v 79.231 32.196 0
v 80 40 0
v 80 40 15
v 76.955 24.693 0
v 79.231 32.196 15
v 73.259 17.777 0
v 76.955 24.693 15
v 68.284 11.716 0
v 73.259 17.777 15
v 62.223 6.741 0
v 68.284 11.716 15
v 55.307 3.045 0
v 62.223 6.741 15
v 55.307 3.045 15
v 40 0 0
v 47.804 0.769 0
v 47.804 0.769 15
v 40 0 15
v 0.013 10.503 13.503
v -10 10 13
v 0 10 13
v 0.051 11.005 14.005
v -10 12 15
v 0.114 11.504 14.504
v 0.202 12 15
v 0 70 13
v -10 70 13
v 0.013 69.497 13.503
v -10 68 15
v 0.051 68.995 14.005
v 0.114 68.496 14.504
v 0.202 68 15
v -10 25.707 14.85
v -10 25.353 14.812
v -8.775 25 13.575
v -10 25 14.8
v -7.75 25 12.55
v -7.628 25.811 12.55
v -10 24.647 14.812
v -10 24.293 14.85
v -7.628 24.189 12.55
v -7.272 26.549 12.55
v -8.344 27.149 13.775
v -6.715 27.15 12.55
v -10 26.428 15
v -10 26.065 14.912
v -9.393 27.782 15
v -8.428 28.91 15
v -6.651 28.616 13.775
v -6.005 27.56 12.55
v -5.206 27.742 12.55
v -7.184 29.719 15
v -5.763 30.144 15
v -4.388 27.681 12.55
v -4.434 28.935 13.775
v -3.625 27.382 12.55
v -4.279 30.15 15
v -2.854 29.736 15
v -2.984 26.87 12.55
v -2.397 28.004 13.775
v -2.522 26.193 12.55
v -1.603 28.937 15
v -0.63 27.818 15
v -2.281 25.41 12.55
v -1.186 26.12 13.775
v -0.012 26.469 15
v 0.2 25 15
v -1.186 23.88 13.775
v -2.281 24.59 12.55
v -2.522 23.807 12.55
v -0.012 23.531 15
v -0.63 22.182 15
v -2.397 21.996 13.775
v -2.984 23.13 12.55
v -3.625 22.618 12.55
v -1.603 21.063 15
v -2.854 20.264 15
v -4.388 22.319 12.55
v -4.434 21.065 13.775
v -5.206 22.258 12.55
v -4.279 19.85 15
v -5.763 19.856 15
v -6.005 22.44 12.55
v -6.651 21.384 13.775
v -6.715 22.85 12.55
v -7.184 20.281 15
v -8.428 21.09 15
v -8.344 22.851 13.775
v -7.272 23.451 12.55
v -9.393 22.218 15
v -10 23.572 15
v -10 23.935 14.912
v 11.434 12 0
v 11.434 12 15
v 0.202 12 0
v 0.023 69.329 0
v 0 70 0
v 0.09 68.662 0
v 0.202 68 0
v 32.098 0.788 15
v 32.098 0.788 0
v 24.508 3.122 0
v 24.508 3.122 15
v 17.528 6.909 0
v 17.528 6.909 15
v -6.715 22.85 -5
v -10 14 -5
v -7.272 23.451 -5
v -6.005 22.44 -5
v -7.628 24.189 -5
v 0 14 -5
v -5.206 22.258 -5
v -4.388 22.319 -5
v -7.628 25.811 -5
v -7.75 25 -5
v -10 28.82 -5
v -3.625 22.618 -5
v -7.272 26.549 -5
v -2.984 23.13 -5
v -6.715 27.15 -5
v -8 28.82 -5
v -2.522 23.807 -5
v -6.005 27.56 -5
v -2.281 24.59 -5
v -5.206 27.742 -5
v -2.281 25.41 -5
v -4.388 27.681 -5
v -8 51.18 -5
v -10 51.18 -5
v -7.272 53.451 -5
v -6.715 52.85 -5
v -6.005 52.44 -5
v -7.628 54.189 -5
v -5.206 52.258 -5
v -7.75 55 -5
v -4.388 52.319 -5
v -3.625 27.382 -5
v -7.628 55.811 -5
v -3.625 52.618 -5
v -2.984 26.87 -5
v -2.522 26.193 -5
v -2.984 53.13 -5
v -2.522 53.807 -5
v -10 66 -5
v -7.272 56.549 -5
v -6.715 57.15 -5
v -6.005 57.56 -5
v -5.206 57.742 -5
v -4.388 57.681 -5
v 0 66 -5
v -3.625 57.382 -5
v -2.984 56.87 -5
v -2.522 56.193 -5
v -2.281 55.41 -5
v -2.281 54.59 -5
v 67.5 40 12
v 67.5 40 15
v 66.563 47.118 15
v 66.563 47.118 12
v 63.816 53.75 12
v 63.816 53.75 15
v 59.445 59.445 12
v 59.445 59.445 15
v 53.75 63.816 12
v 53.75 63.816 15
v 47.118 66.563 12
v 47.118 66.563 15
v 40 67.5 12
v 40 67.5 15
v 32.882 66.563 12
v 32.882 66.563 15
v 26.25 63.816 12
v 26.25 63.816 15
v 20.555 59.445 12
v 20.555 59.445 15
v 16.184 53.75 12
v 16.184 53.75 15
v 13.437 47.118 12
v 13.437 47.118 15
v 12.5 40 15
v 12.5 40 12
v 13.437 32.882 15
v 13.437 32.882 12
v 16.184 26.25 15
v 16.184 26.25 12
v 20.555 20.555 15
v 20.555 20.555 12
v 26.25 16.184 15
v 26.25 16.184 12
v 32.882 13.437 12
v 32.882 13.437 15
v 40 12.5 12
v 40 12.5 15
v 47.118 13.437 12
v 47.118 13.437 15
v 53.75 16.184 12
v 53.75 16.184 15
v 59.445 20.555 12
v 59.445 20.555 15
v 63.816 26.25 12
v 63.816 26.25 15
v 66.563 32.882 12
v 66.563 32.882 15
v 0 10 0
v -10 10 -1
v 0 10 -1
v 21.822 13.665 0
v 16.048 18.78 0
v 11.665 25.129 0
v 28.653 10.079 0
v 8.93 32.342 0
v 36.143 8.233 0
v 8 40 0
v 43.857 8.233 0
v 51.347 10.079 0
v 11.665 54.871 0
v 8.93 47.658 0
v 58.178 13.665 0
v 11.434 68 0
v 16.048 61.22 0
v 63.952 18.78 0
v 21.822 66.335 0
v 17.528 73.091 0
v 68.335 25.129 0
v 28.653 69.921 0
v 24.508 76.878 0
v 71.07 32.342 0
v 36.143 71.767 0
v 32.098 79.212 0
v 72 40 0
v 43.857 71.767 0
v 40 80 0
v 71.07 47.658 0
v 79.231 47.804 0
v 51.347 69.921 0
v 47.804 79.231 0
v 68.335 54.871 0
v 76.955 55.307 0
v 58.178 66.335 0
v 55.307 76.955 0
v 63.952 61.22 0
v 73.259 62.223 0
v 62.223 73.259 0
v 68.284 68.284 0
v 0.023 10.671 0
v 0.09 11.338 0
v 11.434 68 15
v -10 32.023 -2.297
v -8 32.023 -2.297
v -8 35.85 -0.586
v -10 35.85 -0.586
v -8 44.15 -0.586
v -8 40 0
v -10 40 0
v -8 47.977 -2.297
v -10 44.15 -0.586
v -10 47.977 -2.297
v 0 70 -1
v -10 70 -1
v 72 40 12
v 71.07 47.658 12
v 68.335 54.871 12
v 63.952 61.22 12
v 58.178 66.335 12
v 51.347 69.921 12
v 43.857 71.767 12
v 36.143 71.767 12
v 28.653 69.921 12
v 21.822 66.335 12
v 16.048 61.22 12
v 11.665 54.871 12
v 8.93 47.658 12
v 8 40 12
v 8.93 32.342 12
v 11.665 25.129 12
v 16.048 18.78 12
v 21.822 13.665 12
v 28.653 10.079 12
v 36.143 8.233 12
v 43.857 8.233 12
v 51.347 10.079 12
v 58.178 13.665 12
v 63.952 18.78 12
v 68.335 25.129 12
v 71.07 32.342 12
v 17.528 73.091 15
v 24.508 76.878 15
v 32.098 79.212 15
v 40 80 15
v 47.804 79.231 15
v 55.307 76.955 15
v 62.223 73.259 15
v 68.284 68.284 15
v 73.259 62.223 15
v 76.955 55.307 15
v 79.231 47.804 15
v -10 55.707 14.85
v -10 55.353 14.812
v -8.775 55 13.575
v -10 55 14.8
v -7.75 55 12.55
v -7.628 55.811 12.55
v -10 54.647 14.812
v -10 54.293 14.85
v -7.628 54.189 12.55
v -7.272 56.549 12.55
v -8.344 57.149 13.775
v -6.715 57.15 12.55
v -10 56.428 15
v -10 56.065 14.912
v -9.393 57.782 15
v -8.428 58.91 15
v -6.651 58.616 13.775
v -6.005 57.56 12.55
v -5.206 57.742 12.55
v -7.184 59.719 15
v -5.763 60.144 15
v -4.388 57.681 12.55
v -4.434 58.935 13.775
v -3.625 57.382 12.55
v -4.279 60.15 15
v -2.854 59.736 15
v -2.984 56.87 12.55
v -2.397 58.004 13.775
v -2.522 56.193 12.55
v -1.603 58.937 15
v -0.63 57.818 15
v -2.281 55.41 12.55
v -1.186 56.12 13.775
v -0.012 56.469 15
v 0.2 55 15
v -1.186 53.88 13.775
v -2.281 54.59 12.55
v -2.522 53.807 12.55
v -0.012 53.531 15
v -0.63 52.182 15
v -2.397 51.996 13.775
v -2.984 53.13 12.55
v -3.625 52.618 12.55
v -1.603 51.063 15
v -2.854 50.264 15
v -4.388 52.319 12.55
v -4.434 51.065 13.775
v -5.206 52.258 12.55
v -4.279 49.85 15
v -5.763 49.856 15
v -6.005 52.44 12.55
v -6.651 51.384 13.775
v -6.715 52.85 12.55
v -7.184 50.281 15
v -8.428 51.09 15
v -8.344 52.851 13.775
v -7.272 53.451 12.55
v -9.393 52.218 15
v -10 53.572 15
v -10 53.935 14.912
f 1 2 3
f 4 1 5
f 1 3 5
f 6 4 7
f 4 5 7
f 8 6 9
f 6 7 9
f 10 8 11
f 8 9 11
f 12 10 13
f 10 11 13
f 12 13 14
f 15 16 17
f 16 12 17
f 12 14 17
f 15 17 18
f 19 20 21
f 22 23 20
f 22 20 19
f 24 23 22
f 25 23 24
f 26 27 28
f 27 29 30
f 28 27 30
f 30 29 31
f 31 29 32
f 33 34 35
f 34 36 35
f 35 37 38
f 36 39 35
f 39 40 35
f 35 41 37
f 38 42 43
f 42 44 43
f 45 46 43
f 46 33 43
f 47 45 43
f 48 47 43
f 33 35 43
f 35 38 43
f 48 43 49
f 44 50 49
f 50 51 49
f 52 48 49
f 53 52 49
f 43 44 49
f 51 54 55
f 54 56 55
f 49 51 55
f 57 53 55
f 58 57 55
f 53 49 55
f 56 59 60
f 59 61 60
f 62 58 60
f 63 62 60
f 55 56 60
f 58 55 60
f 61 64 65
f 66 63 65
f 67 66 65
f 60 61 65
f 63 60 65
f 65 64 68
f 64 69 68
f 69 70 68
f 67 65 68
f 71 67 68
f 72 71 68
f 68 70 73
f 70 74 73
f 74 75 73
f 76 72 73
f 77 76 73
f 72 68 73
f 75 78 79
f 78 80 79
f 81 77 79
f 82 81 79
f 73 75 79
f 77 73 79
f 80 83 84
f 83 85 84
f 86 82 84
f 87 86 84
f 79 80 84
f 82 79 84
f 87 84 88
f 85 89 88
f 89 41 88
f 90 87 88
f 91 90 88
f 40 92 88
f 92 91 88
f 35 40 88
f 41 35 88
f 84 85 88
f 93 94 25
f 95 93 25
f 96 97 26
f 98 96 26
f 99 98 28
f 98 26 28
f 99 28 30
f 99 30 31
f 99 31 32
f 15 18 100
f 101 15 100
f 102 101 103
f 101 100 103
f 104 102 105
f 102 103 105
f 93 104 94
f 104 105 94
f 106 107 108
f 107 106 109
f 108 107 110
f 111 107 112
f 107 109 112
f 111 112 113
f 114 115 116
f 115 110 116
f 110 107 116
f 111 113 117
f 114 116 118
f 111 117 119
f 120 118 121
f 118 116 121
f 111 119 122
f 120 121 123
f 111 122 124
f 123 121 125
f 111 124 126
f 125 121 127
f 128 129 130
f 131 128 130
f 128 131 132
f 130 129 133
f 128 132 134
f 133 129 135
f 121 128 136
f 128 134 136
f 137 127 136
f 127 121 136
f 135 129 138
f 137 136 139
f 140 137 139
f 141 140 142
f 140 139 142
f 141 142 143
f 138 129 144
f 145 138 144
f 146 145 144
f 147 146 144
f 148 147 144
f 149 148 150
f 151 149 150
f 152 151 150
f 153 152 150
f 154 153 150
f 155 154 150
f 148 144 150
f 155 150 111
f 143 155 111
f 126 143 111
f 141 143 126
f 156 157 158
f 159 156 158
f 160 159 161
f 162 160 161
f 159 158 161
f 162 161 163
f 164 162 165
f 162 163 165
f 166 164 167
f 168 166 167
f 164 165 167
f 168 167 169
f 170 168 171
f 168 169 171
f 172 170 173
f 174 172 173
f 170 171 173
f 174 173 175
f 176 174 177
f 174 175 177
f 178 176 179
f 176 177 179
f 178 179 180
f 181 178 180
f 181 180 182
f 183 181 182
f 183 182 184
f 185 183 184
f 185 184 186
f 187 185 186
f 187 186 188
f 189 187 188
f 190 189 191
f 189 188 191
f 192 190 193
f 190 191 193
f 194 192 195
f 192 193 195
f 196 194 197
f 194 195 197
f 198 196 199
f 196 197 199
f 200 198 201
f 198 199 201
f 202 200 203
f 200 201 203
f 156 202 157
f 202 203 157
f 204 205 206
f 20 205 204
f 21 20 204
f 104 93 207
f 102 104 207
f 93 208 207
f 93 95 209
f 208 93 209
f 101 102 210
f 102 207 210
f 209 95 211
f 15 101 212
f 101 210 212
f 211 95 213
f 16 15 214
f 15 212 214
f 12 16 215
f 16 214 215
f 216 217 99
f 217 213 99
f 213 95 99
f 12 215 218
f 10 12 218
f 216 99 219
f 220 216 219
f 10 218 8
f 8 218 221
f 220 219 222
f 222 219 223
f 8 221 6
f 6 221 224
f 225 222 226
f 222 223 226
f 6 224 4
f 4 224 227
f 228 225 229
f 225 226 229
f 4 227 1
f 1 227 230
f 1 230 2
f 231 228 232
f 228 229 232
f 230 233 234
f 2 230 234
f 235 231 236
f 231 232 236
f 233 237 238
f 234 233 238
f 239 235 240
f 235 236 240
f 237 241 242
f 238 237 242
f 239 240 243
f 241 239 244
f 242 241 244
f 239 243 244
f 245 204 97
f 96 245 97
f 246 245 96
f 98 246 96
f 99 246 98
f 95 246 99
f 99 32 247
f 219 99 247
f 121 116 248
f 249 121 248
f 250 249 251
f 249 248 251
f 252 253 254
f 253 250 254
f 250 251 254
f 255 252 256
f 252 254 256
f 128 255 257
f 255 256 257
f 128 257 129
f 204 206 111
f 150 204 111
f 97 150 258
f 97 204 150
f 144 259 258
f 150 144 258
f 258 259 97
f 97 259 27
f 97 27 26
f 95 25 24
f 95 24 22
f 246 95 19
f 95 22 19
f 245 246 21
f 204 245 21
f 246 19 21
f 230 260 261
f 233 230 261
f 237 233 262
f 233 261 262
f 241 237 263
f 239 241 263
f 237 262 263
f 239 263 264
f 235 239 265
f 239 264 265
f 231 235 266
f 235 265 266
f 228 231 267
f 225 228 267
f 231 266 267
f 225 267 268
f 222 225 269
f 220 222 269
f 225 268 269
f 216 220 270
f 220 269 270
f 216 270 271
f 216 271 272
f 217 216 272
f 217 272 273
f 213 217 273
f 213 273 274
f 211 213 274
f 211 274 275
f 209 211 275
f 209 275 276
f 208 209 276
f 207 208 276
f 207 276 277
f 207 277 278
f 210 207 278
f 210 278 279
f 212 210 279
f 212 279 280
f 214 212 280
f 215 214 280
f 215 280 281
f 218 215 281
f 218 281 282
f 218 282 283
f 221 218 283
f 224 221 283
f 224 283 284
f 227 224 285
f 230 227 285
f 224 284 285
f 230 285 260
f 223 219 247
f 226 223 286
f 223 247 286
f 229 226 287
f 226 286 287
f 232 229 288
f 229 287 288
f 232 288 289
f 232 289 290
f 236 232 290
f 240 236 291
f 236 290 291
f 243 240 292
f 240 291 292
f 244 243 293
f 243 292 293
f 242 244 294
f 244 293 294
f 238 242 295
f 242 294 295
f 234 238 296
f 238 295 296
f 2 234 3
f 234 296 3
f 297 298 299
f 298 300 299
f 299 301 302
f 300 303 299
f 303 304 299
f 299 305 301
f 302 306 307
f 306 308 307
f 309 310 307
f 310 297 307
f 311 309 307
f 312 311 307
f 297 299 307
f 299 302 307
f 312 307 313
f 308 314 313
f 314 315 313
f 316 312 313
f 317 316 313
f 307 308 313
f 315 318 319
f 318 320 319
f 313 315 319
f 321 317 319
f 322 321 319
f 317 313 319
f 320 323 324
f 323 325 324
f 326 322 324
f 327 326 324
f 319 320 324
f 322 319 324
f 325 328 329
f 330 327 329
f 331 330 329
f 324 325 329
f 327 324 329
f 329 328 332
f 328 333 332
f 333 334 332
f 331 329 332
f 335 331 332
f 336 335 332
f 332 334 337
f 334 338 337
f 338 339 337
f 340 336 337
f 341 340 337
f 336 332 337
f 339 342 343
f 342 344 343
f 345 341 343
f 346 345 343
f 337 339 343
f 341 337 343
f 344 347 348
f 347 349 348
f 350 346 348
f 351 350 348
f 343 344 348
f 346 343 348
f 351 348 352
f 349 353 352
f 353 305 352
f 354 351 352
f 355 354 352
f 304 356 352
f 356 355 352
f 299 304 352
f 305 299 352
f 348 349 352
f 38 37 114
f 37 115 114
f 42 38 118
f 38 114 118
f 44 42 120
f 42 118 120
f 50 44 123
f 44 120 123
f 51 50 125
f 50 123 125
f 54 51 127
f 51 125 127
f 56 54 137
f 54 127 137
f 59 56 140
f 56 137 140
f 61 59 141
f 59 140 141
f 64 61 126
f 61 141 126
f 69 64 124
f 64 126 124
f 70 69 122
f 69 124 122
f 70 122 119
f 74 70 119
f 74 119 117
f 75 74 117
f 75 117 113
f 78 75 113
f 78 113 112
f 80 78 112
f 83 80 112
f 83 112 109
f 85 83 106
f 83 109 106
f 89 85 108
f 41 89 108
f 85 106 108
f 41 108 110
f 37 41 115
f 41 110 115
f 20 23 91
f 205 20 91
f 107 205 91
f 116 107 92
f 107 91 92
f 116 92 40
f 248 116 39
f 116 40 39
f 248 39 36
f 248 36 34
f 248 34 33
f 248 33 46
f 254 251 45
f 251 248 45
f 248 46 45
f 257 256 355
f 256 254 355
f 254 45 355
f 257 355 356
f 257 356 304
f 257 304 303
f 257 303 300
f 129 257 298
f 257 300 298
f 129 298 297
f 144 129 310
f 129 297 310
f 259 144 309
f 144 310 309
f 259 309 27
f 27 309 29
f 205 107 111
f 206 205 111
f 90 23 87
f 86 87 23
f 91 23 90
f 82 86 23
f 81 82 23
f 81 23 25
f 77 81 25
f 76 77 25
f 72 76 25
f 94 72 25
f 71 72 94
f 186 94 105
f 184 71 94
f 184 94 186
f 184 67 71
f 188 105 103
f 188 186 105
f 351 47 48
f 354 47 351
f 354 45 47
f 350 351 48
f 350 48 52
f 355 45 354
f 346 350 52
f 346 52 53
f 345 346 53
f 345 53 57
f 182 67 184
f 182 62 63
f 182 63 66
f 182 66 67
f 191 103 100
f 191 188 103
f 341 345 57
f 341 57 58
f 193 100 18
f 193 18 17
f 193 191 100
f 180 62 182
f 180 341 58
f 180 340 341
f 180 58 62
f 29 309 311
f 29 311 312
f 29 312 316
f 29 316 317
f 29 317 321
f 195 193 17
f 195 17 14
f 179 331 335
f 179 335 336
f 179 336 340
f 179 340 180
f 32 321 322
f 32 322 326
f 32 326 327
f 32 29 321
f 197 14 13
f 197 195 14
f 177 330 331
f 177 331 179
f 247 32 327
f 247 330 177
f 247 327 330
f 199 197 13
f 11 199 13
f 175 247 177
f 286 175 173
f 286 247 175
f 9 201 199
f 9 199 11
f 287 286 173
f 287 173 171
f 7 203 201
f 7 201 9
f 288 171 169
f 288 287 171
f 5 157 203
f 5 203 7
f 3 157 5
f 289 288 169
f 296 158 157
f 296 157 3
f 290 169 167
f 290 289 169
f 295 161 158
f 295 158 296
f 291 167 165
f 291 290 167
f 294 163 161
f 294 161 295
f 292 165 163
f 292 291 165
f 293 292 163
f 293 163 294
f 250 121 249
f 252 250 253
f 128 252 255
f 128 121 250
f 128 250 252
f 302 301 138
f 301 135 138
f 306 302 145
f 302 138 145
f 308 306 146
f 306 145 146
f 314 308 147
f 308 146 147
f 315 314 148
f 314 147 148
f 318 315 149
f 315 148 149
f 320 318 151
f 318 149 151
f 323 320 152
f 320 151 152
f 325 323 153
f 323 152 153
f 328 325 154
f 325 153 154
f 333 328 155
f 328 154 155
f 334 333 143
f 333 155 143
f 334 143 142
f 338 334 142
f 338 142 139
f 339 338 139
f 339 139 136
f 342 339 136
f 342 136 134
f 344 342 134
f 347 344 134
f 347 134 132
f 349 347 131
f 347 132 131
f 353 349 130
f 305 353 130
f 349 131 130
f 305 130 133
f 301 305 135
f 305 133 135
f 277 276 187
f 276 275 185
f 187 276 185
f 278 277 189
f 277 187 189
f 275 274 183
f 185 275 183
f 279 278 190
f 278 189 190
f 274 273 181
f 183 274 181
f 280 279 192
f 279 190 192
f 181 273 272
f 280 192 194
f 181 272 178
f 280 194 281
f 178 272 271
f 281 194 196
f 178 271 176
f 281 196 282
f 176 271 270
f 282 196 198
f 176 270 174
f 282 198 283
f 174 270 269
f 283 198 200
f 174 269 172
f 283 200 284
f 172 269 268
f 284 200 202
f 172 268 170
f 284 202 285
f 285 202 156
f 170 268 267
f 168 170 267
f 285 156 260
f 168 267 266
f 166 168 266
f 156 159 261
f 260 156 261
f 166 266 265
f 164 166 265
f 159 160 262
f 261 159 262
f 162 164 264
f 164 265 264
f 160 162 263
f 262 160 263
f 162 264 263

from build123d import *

# Parameters (mm, degrees)
SKETCH1_W                                       = 80
SKETCH1_H                                       = 80
BOSS_EXTRUDE1_DEPTH                             = 15
SKETCH2_R                                       = 32
CUT_EXTRUDE2_DEPTH                              = 16
SKETCH3_R                                       = 32
SKETCH3_R_2                                     = 27.5
BOSS_EXTRUDE2_DEPTH                             = 3
FILLET1_R                                       = 10
SKETCH5_W                                       = 10
SKETCH5_H                                       = 60
BOSS_EXTRUDE3_DEPTH                             = 20
SKETCH6_R                                       = 2.5
CUT_EXTRUDE3_DEPTH                              = 21
CHAMFER1_SIZE                                   = 2
CSK_FOR_M5_FLAT_HEAD_MACHINE_SCREW2_D           = 5.5
CSK_FOR_M5_FLAT_HEAD_MACHINE_SCREW2_CSINK_D     = 10.4
CSK_FOR_M5_FLAT_HEAD_MACHINE_SCREW2_CSINK_ANGLE = 90
CHAMFER2_SIZE                                   = 4
SKETCH11_R                                      = 15
CUT_EXTRUDE4_DEPTH                              = 2
CUT_EXTRUDE7_DEPTH                              = 21


with BuildPart() as part:
    # Sketch1 → Boss-Extrude1 (new body)
    with BuildSketch(Plane.XY):
        with Locations((40, 40)):
            Rectangle(SKETCH1_W, SKETCH1_H)
    extrude(amount=BOSS_EXTRUDE1_DEPTH)

    # Sketch2 → Cut-Extrude2 (cut, through all)
    with BuildSketch(Plane.XY.offset(15)):
        with Locations((40, 40)):
            Circle(SKETCH2_R)
    extrude(amount=-CUT_EXTRUDE2_DEPTH, mode=Mode.SUBTRACT)

    # Sketch3 → Boss-Extrude2 (add)
    with BuildSketch(Plane.XY.offset(15)):
        with Locations((40, 40)):
            Circle(SKETCH3_R)
        with Locations((40, 40)):
            Circle(SKETCH3_R_2, mode=Mode.SUBTRACT)
    extrude(amount=-BOSS_EXTRUDE2_DEPTH)

    # Fillet1
    fillet1_edges = [part.edges().sort_by_distance(p)[0] for p in [
        (0, 80, 7.5),
        (80, 80, 7.5),
        (80, 0, 7.5),
        (0, 0, 7.5),
    ]]
    fillet(fillet1_edges, radius=FILLET1_R)

    # Sketch5 → Boss-Extrude3 (add)
    with BuildSketch(Plane.XY.offset(15)):
        with Locations((-5, 40)):
            Rectangle(SKETCH5_W, SKETCH5_H)
    extrude(amount=-BOSS_EXTRUDE3_DEPTH)

    # Sketch6 → Cut-Extrude3 (cut, through all)
    with BuildSketch(Plane.XY.offset(15)):
        with Locations((-5, 55)):
            Circle(SKETCH6_R)
        with Locations((-5, 25)):
            Circle(SKETCH6_R)
    extrude(amount=-CUT_EXTRUDE3_DEPTH, mode=Mode.SUBTRACT)

    # Chamfer1
    chamfer1_edges = [part.edges().sort_by_distance(p)[0] for p in [
        (-5, 70, 15),
        (-5, 10, 15),
    ]]
    chamfer(chamfer1_edges, length=CHAMFER1_SIZE)

    # CSK for M5 Flat Head Machine Screw2 (through all)
    with Locations(Plane.XY.offset(15)):
        with Locations((-5, 55), (-5, 25)):
            CounterSinkHole(CSK_FOR_M5_FLAT_HEAD_MACHINE_SCREW2_D / 2, CSK_FOR_M5_FLAT_HEAD_MACHINE_SCREW2_CSINK_D / 2, counter_sink_angle=CSK_FOR_M5_FLAT_HEAD_MACHINE_SCREW2_CSINK_ANGLE)

    # Chamfer2
    chamfer2_edges = [part.edges().sort_by_distance(p)[0] for p in [
        (-5, 10, -5),
        (-5, 70, -5),
    ]]
    chamfer(chamfer2_edges, length=CHAMFER2_SIZE)

    # Sketch11 → Cut-Extrude4 (cut)
    with BuildSketch(Plane.ZY.offset(10)):
        with Locations((-15, 40)):
            Circle(SKETCH11_R)
    extrude(amount=-CUT_EXTRUDE4_DEPTH, mode=Mode.SUBTRACT)

    # Sketch12 → Cut-Extrude7 (cut, through all)
    with BuildSketch(Plane.XY.offset(15)):
        with BuildLine():
            Line((11.434286286, 12), (0.202041029, 12))
            ThreePointArc((0.202041029, 12), (0.05063847, 11.00508962), (0, 10))
            ThreePointArc((0, 10), (2.928932188, 2.928932188), (10, 0))
            Line((10, 0), (40, 0))
            ThreePointArc((40, 0), (24.508066615, 3.121822171), (11.434286286, 12))
        make_face()
        with BuildLine():
            ThreePointArc((80, 40), (68.284271247, 11.715728753), (40, 0))
            Line((40, 0), (70, 0))
            ThreePointArc((70, 0), (77.071067812, 2.928932188), (80, 10))
            Line((80, 10), (80, 40))
        make_face()
        with BuildLine():
            ThreePointArc((40.000000226, 80), (68.284271327, 68.284271168), (80, 40))
            Line((80, 40), (80, 70))
            ThreePointArc((80, 70), (77.071067812, 77.071067812), (70, 80))
            Line((70, 80), (40.000000226, 80))
        make_face()
        with BuildLine():
            ThreePointArc((11.434286286, 68), (24.508066719, 76.878177873), (40.000000226, 80))
            Line((40.000000226, 80), (10, 80))
            ThreePointArc((10, 80), (2.928932174, 77.071067798), (0, 69.99999996))
            ThreePointArc((0, 69.99999996), (0.050638472, 68.99491036), (0.202041029, 68))
            Line((0.202041029, 68), (11.434286286, 68))
        make_face()
    extrude(amount=-CUT_EXTRUDE7_DEPTH, mode=Mode.SUBTRACT)


solid = part.part
